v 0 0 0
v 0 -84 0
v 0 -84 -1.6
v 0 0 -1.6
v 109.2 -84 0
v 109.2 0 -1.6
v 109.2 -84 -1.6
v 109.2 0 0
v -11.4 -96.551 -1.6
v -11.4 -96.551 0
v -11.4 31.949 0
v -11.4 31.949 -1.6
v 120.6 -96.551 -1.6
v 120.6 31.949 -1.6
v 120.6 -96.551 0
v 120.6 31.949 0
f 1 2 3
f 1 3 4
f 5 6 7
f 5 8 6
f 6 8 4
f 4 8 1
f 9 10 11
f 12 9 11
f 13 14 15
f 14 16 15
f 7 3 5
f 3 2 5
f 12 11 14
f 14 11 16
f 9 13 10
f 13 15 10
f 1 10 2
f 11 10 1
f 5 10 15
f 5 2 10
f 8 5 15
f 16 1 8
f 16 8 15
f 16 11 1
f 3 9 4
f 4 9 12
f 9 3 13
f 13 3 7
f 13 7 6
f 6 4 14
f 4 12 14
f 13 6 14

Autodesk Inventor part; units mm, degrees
ref_plane "YZ Plane" through (0, 0, 0) normal (1, 0, 0) x (0, 1, 0)
ref_plane "XZ Plane" through (0, 0, 0) normal (0, 1, 0) x (-1, 0, 0)
ref_plane "XY Plane" through (0, 0, 0) normal (0, 0, 1) x (1, 0, 0)
sketch "Sketch1" plane through (0, 0, 0) normal (0, 0, 1) x (1, 0, 0)
  line L0 (109.2, 0) -> (109.2, -84) projected
  line L1 (0, -84) -> (0, 0) projected
  line L2 (0, -84) -> (109.2, -84)
  line L3 (109.2, -84) -> (109.2, 0)
  line L4 (109.2, 0) -> (0, 0)
  line L5 (0, 0) -> (0, -84)
  line L6 (-11.4, 31.9489) -> (120.6, 31.9489)
  line L7 (120.6, 31.9489) -> (120.6, -96.5511)
  line L8 (120.6, -96.5511) -> (-11.4, -96.5511)
  line L9 (-11.4, -96.5511) -> (-11.4, 31.9489)
  line L10 (117.1, 20.1989) -> (-7.9, 20.1989)
  line L11 (-7.9, 20.1989) -> (-7.9, -84.8011)
  line L12 (-7.9, -84.8011) -> (117.1, -84.8011)
  line L13 (117.1, -84.8011) -> (117.1, 20.1989)
  line L14 (-7.9, -84.8011) -> (-7.9, -96.5511)
  line L15 (-7.9, 20.1989) -> (-7.9, 31.9489)
  line L16 (109.2, -42) -> (117.1, -42)
  line L17 (0, -42) -> (-7.9, -42)
  line L18 (120.6, -32.3011) -> (117.1, -32.3011)
  line L19 (-7.9, -32.3011) -> (-11.4, -32.3011)
  dimension "d0" = 128.5
  dimension "d1" = 105
  dimension "d3" = 125
  dimension "d4" = 132
extrude "Extrusion1" add sketch "Sketch1" against normal blind 1.6 contours L4 L1 L17 L11 L10 L13 L16 L0 | L16 L13 L12 L11 L17 L1 L2 L0 | L13 L18 L7 L8 L14 L12 | L13 L10 L15 L6 L7 L18 | L11 L14 L8 L9 L19 | L19 L9 L6 L15 L11
properties part number "Frontpanel"
